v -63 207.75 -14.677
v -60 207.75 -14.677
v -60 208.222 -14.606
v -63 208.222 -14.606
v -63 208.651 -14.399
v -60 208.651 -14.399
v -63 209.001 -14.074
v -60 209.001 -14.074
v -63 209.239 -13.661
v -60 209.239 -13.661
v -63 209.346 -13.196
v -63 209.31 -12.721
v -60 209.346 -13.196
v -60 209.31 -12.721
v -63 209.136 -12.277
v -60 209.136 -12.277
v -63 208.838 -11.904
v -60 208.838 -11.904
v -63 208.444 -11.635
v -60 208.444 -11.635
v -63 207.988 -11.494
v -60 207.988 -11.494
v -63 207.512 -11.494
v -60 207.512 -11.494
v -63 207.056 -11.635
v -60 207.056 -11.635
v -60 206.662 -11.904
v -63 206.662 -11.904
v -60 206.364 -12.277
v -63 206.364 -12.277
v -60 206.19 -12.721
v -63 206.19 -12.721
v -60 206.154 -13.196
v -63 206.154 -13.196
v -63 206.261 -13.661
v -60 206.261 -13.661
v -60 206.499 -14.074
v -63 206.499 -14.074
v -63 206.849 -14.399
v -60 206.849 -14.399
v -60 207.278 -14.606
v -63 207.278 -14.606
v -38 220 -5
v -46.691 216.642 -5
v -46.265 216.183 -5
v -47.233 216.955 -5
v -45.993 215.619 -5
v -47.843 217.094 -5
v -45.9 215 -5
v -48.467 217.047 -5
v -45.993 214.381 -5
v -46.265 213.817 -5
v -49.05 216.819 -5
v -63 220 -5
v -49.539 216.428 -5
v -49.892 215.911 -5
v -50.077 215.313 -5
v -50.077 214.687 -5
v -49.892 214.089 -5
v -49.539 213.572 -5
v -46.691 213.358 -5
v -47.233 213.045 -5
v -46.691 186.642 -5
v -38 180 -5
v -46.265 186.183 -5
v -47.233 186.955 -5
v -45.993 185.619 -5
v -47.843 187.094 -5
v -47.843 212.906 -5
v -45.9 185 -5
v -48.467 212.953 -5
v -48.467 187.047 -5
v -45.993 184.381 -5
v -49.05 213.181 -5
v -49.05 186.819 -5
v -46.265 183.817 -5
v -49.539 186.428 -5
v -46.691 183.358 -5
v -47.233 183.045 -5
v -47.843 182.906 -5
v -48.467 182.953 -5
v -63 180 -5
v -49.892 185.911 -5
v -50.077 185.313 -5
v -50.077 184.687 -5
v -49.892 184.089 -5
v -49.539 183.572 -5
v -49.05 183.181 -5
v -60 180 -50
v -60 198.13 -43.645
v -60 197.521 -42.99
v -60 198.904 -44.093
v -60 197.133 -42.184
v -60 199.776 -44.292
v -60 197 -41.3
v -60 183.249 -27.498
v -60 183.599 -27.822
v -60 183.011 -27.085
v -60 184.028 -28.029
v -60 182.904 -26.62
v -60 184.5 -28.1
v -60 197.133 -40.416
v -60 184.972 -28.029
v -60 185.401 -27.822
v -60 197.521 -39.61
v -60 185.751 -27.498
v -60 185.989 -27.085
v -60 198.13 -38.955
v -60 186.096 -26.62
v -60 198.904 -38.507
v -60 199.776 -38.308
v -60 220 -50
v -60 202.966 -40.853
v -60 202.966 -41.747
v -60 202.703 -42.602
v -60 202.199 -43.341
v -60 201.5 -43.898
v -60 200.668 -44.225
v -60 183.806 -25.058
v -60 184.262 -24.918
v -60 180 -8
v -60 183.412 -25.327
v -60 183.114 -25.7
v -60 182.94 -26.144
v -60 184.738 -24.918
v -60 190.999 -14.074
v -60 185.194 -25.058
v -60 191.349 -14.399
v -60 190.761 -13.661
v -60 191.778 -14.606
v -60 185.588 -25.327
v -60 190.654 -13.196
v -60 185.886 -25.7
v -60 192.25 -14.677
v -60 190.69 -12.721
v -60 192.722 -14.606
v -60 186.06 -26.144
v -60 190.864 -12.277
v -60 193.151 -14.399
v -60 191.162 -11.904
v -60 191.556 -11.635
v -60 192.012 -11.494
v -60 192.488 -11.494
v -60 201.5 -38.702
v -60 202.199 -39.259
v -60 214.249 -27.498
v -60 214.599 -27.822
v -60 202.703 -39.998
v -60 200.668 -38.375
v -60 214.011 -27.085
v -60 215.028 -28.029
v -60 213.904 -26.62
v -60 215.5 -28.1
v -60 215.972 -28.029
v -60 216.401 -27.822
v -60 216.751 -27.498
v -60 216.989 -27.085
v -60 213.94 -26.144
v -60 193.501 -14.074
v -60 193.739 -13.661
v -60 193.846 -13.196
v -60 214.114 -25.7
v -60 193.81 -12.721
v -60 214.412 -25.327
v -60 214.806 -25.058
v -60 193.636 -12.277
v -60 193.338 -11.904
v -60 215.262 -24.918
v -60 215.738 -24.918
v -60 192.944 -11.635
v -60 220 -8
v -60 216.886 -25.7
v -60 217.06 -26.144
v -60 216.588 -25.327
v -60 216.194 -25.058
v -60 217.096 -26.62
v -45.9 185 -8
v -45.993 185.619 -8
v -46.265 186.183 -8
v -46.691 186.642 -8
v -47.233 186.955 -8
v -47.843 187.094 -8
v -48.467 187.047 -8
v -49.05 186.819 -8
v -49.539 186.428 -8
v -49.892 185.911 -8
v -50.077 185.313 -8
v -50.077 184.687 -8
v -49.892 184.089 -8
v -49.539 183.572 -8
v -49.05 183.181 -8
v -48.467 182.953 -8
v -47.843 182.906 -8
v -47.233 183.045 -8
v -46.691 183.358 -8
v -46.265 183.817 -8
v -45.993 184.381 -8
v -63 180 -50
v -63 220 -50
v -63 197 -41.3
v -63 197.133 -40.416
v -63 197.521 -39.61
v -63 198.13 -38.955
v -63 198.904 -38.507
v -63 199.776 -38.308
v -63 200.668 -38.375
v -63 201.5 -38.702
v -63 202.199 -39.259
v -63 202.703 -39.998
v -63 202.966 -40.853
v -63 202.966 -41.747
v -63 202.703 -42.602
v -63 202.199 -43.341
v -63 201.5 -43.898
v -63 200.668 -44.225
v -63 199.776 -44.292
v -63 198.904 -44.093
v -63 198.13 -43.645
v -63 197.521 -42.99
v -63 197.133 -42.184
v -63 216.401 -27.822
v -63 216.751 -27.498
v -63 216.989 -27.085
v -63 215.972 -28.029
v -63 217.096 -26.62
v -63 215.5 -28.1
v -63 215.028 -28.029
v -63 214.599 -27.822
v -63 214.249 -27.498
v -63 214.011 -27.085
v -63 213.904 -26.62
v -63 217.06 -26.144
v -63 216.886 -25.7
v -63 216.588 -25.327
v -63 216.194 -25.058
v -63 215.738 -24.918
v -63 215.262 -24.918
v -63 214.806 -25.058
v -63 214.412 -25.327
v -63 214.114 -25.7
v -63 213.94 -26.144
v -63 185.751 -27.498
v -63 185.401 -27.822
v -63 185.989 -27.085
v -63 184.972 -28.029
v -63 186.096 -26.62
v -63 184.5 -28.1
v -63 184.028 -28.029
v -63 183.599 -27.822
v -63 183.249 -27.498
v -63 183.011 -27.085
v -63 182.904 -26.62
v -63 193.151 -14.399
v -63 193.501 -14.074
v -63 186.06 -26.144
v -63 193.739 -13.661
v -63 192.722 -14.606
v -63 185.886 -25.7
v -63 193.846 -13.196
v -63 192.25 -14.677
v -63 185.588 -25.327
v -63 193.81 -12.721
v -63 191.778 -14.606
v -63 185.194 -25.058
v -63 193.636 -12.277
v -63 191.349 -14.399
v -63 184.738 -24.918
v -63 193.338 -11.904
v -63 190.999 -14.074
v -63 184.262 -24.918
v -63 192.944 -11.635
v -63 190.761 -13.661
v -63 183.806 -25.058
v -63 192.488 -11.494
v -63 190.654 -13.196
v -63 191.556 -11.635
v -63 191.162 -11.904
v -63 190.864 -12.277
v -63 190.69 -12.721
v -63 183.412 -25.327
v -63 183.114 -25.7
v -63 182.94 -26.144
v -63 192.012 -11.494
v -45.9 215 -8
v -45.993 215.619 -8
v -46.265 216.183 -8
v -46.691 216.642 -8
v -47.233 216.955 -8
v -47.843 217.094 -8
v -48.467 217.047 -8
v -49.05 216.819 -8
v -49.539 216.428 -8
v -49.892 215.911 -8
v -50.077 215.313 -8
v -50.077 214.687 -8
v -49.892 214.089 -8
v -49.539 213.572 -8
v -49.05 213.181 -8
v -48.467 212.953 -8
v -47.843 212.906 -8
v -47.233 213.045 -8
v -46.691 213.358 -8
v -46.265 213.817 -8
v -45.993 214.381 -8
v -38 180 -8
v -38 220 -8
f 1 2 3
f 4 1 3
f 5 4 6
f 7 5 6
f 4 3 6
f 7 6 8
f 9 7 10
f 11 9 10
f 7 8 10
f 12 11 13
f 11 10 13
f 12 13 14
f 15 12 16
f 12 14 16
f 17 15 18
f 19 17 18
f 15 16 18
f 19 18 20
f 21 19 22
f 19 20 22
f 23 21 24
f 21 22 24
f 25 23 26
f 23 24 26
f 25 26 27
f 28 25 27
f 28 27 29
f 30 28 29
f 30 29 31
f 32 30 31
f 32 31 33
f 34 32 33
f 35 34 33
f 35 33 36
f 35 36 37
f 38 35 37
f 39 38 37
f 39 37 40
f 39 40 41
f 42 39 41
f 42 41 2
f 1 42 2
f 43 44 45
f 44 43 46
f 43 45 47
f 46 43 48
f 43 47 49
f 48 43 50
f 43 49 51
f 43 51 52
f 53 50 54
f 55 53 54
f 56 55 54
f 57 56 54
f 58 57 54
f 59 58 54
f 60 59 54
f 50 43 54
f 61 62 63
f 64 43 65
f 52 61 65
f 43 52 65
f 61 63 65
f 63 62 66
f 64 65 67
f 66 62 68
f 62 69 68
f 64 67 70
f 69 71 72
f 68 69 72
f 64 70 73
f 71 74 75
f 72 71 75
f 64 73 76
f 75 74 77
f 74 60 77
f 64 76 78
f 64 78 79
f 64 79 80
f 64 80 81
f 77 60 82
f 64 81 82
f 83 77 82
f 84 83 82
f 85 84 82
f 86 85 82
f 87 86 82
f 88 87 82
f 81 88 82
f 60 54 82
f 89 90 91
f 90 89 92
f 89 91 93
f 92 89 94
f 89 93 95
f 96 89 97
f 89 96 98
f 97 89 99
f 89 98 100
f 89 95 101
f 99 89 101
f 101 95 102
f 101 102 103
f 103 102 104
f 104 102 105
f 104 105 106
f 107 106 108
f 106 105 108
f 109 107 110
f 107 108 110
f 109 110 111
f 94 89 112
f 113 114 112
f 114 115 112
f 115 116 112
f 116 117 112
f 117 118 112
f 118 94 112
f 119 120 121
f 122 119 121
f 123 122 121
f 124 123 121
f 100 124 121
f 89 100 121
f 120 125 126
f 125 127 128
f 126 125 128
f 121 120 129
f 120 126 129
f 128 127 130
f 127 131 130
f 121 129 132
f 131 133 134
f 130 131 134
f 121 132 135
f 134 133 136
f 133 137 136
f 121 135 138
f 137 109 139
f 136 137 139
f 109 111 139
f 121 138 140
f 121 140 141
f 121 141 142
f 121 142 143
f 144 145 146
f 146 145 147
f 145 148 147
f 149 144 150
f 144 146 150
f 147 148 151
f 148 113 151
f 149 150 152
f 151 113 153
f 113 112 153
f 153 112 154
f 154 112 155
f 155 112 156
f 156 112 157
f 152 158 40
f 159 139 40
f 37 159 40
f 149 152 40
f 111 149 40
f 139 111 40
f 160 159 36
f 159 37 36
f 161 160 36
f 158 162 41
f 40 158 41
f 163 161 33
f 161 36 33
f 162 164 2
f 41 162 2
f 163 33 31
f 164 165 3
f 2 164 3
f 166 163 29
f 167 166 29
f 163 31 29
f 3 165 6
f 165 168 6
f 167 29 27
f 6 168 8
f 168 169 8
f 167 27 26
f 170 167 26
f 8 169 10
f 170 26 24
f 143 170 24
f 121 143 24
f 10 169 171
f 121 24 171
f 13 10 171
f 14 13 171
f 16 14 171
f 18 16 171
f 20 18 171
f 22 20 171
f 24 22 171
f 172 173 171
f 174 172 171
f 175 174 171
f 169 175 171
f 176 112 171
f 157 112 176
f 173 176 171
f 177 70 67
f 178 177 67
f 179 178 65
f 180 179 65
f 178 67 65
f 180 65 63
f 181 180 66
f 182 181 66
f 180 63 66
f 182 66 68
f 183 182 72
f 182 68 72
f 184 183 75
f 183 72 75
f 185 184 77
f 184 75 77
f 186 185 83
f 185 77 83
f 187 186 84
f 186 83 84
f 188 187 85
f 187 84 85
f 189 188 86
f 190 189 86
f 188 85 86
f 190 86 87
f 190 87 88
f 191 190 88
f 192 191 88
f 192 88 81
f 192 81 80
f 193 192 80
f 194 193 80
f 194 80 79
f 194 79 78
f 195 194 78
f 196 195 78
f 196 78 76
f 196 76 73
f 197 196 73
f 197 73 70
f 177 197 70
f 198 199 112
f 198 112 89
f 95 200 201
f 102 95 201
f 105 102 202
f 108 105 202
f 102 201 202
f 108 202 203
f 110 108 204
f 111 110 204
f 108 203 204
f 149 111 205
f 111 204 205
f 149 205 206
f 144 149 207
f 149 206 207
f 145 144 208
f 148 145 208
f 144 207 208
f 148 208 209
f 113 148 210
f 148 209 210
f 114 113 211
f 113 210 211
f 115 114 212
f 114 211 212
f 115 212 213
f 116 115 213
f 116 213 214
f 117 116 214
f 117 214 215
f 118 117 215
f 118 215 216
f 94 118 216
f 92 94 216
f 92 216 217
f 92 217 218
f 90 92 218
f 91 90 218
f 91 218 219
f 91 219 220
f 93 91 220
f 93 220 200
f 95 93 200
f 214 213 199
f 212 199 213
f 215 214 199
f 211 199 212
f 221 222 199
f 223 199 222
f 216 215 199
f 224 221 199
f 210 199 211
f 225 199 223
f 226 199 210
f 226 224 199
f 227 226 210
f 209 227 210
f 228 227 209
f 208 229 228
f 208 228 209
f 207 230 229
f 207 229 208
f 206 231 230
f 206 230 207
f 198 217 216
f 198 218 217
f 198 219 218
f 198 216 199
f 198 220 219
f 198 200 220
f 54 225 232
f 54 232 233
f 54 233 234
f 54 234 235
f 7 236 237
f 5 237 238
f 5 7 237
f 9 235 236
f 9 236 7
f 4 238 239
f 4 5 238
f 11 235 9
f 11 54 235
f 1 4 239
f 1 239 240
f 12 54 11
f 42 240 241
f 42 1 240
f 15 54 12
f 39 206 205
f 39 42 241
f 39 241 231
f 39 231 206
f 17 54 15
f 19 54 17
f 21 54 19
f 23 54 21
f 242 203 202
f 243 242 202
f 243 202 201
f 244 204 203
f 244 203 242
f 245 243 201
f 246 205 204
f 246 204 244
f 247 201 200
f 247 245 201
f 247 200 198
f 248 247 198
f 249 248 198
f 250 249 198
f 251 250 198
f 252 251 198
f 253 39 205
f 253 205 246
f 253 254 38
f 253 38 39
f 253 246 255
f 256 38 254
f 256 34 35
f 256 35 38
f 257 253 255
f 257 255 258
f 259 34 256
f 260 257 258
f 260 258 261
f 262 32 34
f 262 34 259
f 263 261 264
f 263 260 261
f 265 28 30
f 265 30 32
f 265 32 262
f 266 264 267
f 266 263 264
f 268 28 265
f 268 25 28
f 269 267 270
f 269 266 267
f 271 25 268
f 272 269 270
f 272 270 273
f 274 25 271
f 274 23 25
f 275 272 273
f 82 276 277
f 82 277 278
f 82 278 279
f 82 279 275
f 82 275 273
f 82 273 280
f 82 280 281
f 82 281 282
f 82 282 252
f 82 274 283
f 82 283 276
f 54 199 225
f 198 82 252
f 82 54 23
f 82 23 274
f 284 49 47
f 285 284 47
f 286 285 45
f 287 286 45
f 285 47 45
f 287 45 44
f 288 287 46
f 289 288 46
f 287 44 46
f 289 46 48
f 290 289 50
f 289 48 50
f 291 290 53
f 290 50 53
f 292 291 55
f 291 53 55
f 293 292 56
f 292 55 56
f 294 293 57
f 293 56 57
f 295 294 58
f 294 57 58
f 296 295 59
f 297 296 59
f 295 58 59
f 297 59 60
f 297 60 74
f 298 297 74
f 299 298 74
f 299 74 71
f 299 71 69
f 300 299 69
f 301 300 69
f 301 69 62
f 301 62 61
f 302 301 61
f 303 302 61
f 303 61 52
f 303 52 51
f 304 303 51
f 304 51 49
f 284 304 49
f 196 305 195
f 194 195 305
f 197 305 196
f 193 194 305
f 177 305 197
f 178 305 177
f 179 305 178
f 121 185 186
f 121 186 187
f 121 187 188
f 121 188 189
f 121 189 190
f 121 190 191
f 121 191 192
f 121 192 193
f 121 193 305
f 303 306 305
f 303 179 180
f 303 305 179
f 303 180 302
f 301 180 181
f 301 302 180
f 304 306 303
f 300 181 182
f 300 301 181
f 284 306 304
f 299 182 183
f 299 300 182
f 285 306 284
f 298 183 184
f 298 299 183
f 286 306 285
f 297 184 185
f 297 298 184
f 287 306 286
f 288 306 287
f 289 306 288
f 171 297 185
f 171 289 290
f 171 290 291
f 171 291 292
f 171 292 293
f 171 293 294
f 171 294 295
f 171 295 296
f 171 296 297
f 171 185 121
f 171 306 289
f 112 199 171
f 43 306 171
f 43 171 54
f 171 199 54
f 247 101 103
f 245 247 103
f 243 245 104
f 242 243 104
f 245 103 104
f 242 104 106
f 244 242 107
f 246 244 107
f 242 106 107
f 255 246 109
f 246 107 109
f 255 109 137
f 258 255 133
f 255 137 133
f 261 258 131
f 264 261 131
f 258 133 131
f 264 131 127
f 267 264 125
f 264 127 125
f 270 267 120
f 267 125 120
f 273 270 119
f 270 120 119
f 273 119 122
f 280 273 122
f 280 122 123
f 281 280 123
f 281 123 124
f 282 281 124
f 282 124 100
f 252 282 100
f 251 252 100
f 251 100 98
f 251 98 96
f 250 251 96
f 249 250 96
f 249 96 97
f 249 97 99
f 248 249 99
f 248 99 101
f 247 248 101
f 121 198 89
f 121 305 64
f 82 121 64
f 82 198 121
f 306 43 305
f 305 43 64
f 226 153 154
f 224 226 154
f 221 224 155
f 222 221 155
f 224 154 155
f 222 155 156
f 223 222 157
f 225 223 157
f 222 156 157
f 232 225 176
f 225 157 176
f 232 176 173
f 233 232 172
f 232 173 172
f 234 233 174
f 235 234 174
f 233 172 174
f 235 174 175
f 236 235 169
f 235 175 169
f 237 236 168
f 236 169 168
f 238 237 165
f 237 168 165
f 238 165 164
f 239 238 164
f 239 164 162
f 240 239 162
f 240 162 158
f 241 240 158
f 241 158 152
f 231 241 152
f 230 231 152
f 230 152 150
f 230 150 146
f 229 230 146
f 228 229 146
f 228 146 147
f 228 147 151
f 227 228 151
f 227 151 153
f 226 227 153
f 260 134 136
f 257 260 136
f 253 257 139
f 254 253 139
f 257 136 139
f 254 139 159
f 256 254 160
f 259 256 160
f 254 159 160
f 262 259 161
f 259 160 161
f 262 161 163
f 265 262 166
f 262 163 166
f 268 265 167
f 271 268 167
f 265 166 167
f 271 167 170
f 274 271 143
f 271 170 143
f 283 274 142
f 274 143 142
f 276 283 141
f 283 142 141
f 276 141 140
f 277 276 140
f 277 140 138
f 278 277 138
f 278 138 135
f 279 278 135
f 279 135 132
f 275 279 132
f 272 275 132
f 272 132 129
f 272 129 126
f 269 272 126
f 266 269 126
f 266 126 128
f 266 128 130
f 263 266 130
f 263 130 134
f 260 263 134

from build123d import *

# Parameters (mm, degrees)
SKETCH_1_W                  = 40
SKETCH_1_H                  = 45
EXTRUDE_1_DEPTH             = 25
SKETCH_2_W                  = 22
SKETCH_2_H                  = 50
CUT_EXTRUDE_1_DEPTH         = 90.827612681
SKETCH_3_R                  = 3
CUT_EXTRUDE_2_DEPTH         = 227.991189256
HOLE_WIZARD_4_2_4_2_1_D     = 4.2
HOLE_WIZARD_3_2_3_2_1_D     = 3.2
HOLE_WIZARD_3_2_3_2_1_DEPTH = 25


with BuildPart() as part:
    # 草图1 → 凸台-拉伸1 (new body)
    with BuildSketch(Plane(origin=(-63, 0, 0), x_dir=(0, -1, 0), z_dir=(-1, 0, 0))):
        with Locations((-200, -27.5)):
            Rectangle(SKETCH_1_W, SKETCH_1_H)
    extrude(amount=-EXTRUDE_1_DEPTH)

    # 草图2 → 切除-拉伸1 (cut, through all)
    with BuildSketch(Plane(origin=(0, 220, 0), x_dir=(-1, 0, 0), z_dir=(0, 1, 0))):
        with Locations((49, -33)):
            Rectangle(SKETCH_2_W, SKETCH_2_H)
    extrude(amount=-CUT_EXTRUDE_1_DEPTH, mode=Mode.SUBTRACT)

    # 草图3 → 切除-拉伸2 (cut, through all)
    with BuildSketch(Plane.ZY.offset(63)):
        with Locations(Location((-41.3, 200, 0), (0, 0, 270))):
            Circle(SKETCH_3_R)
    extrude(amount=-CUT_EXTRUDE_2_DEPTH, mode=Mode.SUBTRACT)

    # Ø4.2 (4.2) 直径孔1 (through all)
    with Locations(Plane(origin=(0, 0, -8), x_dir=(-1, 0, 0), z_dir=(0, 0, -1))):
        with Locations((48, 215), (48, 185)):
            Hole(HOLE_WIZARD_4_2_4_2_1_D / 2)

    # Ø3.2 (3.2) 直径孔1
    with Locations(Plane.ZY.offset(63)):
        with Locations((-26.5, 215.5), (-26.5, 184.5), (-13.076606241, 207.75), (-13.076606241, 192.25)):
            Hole(HOLE_WIZARD_3_2_3_2_1_D / 2, depth=HOLE_WIZARD_3_2_3_2_1_DEPTH)


solid = part.part
